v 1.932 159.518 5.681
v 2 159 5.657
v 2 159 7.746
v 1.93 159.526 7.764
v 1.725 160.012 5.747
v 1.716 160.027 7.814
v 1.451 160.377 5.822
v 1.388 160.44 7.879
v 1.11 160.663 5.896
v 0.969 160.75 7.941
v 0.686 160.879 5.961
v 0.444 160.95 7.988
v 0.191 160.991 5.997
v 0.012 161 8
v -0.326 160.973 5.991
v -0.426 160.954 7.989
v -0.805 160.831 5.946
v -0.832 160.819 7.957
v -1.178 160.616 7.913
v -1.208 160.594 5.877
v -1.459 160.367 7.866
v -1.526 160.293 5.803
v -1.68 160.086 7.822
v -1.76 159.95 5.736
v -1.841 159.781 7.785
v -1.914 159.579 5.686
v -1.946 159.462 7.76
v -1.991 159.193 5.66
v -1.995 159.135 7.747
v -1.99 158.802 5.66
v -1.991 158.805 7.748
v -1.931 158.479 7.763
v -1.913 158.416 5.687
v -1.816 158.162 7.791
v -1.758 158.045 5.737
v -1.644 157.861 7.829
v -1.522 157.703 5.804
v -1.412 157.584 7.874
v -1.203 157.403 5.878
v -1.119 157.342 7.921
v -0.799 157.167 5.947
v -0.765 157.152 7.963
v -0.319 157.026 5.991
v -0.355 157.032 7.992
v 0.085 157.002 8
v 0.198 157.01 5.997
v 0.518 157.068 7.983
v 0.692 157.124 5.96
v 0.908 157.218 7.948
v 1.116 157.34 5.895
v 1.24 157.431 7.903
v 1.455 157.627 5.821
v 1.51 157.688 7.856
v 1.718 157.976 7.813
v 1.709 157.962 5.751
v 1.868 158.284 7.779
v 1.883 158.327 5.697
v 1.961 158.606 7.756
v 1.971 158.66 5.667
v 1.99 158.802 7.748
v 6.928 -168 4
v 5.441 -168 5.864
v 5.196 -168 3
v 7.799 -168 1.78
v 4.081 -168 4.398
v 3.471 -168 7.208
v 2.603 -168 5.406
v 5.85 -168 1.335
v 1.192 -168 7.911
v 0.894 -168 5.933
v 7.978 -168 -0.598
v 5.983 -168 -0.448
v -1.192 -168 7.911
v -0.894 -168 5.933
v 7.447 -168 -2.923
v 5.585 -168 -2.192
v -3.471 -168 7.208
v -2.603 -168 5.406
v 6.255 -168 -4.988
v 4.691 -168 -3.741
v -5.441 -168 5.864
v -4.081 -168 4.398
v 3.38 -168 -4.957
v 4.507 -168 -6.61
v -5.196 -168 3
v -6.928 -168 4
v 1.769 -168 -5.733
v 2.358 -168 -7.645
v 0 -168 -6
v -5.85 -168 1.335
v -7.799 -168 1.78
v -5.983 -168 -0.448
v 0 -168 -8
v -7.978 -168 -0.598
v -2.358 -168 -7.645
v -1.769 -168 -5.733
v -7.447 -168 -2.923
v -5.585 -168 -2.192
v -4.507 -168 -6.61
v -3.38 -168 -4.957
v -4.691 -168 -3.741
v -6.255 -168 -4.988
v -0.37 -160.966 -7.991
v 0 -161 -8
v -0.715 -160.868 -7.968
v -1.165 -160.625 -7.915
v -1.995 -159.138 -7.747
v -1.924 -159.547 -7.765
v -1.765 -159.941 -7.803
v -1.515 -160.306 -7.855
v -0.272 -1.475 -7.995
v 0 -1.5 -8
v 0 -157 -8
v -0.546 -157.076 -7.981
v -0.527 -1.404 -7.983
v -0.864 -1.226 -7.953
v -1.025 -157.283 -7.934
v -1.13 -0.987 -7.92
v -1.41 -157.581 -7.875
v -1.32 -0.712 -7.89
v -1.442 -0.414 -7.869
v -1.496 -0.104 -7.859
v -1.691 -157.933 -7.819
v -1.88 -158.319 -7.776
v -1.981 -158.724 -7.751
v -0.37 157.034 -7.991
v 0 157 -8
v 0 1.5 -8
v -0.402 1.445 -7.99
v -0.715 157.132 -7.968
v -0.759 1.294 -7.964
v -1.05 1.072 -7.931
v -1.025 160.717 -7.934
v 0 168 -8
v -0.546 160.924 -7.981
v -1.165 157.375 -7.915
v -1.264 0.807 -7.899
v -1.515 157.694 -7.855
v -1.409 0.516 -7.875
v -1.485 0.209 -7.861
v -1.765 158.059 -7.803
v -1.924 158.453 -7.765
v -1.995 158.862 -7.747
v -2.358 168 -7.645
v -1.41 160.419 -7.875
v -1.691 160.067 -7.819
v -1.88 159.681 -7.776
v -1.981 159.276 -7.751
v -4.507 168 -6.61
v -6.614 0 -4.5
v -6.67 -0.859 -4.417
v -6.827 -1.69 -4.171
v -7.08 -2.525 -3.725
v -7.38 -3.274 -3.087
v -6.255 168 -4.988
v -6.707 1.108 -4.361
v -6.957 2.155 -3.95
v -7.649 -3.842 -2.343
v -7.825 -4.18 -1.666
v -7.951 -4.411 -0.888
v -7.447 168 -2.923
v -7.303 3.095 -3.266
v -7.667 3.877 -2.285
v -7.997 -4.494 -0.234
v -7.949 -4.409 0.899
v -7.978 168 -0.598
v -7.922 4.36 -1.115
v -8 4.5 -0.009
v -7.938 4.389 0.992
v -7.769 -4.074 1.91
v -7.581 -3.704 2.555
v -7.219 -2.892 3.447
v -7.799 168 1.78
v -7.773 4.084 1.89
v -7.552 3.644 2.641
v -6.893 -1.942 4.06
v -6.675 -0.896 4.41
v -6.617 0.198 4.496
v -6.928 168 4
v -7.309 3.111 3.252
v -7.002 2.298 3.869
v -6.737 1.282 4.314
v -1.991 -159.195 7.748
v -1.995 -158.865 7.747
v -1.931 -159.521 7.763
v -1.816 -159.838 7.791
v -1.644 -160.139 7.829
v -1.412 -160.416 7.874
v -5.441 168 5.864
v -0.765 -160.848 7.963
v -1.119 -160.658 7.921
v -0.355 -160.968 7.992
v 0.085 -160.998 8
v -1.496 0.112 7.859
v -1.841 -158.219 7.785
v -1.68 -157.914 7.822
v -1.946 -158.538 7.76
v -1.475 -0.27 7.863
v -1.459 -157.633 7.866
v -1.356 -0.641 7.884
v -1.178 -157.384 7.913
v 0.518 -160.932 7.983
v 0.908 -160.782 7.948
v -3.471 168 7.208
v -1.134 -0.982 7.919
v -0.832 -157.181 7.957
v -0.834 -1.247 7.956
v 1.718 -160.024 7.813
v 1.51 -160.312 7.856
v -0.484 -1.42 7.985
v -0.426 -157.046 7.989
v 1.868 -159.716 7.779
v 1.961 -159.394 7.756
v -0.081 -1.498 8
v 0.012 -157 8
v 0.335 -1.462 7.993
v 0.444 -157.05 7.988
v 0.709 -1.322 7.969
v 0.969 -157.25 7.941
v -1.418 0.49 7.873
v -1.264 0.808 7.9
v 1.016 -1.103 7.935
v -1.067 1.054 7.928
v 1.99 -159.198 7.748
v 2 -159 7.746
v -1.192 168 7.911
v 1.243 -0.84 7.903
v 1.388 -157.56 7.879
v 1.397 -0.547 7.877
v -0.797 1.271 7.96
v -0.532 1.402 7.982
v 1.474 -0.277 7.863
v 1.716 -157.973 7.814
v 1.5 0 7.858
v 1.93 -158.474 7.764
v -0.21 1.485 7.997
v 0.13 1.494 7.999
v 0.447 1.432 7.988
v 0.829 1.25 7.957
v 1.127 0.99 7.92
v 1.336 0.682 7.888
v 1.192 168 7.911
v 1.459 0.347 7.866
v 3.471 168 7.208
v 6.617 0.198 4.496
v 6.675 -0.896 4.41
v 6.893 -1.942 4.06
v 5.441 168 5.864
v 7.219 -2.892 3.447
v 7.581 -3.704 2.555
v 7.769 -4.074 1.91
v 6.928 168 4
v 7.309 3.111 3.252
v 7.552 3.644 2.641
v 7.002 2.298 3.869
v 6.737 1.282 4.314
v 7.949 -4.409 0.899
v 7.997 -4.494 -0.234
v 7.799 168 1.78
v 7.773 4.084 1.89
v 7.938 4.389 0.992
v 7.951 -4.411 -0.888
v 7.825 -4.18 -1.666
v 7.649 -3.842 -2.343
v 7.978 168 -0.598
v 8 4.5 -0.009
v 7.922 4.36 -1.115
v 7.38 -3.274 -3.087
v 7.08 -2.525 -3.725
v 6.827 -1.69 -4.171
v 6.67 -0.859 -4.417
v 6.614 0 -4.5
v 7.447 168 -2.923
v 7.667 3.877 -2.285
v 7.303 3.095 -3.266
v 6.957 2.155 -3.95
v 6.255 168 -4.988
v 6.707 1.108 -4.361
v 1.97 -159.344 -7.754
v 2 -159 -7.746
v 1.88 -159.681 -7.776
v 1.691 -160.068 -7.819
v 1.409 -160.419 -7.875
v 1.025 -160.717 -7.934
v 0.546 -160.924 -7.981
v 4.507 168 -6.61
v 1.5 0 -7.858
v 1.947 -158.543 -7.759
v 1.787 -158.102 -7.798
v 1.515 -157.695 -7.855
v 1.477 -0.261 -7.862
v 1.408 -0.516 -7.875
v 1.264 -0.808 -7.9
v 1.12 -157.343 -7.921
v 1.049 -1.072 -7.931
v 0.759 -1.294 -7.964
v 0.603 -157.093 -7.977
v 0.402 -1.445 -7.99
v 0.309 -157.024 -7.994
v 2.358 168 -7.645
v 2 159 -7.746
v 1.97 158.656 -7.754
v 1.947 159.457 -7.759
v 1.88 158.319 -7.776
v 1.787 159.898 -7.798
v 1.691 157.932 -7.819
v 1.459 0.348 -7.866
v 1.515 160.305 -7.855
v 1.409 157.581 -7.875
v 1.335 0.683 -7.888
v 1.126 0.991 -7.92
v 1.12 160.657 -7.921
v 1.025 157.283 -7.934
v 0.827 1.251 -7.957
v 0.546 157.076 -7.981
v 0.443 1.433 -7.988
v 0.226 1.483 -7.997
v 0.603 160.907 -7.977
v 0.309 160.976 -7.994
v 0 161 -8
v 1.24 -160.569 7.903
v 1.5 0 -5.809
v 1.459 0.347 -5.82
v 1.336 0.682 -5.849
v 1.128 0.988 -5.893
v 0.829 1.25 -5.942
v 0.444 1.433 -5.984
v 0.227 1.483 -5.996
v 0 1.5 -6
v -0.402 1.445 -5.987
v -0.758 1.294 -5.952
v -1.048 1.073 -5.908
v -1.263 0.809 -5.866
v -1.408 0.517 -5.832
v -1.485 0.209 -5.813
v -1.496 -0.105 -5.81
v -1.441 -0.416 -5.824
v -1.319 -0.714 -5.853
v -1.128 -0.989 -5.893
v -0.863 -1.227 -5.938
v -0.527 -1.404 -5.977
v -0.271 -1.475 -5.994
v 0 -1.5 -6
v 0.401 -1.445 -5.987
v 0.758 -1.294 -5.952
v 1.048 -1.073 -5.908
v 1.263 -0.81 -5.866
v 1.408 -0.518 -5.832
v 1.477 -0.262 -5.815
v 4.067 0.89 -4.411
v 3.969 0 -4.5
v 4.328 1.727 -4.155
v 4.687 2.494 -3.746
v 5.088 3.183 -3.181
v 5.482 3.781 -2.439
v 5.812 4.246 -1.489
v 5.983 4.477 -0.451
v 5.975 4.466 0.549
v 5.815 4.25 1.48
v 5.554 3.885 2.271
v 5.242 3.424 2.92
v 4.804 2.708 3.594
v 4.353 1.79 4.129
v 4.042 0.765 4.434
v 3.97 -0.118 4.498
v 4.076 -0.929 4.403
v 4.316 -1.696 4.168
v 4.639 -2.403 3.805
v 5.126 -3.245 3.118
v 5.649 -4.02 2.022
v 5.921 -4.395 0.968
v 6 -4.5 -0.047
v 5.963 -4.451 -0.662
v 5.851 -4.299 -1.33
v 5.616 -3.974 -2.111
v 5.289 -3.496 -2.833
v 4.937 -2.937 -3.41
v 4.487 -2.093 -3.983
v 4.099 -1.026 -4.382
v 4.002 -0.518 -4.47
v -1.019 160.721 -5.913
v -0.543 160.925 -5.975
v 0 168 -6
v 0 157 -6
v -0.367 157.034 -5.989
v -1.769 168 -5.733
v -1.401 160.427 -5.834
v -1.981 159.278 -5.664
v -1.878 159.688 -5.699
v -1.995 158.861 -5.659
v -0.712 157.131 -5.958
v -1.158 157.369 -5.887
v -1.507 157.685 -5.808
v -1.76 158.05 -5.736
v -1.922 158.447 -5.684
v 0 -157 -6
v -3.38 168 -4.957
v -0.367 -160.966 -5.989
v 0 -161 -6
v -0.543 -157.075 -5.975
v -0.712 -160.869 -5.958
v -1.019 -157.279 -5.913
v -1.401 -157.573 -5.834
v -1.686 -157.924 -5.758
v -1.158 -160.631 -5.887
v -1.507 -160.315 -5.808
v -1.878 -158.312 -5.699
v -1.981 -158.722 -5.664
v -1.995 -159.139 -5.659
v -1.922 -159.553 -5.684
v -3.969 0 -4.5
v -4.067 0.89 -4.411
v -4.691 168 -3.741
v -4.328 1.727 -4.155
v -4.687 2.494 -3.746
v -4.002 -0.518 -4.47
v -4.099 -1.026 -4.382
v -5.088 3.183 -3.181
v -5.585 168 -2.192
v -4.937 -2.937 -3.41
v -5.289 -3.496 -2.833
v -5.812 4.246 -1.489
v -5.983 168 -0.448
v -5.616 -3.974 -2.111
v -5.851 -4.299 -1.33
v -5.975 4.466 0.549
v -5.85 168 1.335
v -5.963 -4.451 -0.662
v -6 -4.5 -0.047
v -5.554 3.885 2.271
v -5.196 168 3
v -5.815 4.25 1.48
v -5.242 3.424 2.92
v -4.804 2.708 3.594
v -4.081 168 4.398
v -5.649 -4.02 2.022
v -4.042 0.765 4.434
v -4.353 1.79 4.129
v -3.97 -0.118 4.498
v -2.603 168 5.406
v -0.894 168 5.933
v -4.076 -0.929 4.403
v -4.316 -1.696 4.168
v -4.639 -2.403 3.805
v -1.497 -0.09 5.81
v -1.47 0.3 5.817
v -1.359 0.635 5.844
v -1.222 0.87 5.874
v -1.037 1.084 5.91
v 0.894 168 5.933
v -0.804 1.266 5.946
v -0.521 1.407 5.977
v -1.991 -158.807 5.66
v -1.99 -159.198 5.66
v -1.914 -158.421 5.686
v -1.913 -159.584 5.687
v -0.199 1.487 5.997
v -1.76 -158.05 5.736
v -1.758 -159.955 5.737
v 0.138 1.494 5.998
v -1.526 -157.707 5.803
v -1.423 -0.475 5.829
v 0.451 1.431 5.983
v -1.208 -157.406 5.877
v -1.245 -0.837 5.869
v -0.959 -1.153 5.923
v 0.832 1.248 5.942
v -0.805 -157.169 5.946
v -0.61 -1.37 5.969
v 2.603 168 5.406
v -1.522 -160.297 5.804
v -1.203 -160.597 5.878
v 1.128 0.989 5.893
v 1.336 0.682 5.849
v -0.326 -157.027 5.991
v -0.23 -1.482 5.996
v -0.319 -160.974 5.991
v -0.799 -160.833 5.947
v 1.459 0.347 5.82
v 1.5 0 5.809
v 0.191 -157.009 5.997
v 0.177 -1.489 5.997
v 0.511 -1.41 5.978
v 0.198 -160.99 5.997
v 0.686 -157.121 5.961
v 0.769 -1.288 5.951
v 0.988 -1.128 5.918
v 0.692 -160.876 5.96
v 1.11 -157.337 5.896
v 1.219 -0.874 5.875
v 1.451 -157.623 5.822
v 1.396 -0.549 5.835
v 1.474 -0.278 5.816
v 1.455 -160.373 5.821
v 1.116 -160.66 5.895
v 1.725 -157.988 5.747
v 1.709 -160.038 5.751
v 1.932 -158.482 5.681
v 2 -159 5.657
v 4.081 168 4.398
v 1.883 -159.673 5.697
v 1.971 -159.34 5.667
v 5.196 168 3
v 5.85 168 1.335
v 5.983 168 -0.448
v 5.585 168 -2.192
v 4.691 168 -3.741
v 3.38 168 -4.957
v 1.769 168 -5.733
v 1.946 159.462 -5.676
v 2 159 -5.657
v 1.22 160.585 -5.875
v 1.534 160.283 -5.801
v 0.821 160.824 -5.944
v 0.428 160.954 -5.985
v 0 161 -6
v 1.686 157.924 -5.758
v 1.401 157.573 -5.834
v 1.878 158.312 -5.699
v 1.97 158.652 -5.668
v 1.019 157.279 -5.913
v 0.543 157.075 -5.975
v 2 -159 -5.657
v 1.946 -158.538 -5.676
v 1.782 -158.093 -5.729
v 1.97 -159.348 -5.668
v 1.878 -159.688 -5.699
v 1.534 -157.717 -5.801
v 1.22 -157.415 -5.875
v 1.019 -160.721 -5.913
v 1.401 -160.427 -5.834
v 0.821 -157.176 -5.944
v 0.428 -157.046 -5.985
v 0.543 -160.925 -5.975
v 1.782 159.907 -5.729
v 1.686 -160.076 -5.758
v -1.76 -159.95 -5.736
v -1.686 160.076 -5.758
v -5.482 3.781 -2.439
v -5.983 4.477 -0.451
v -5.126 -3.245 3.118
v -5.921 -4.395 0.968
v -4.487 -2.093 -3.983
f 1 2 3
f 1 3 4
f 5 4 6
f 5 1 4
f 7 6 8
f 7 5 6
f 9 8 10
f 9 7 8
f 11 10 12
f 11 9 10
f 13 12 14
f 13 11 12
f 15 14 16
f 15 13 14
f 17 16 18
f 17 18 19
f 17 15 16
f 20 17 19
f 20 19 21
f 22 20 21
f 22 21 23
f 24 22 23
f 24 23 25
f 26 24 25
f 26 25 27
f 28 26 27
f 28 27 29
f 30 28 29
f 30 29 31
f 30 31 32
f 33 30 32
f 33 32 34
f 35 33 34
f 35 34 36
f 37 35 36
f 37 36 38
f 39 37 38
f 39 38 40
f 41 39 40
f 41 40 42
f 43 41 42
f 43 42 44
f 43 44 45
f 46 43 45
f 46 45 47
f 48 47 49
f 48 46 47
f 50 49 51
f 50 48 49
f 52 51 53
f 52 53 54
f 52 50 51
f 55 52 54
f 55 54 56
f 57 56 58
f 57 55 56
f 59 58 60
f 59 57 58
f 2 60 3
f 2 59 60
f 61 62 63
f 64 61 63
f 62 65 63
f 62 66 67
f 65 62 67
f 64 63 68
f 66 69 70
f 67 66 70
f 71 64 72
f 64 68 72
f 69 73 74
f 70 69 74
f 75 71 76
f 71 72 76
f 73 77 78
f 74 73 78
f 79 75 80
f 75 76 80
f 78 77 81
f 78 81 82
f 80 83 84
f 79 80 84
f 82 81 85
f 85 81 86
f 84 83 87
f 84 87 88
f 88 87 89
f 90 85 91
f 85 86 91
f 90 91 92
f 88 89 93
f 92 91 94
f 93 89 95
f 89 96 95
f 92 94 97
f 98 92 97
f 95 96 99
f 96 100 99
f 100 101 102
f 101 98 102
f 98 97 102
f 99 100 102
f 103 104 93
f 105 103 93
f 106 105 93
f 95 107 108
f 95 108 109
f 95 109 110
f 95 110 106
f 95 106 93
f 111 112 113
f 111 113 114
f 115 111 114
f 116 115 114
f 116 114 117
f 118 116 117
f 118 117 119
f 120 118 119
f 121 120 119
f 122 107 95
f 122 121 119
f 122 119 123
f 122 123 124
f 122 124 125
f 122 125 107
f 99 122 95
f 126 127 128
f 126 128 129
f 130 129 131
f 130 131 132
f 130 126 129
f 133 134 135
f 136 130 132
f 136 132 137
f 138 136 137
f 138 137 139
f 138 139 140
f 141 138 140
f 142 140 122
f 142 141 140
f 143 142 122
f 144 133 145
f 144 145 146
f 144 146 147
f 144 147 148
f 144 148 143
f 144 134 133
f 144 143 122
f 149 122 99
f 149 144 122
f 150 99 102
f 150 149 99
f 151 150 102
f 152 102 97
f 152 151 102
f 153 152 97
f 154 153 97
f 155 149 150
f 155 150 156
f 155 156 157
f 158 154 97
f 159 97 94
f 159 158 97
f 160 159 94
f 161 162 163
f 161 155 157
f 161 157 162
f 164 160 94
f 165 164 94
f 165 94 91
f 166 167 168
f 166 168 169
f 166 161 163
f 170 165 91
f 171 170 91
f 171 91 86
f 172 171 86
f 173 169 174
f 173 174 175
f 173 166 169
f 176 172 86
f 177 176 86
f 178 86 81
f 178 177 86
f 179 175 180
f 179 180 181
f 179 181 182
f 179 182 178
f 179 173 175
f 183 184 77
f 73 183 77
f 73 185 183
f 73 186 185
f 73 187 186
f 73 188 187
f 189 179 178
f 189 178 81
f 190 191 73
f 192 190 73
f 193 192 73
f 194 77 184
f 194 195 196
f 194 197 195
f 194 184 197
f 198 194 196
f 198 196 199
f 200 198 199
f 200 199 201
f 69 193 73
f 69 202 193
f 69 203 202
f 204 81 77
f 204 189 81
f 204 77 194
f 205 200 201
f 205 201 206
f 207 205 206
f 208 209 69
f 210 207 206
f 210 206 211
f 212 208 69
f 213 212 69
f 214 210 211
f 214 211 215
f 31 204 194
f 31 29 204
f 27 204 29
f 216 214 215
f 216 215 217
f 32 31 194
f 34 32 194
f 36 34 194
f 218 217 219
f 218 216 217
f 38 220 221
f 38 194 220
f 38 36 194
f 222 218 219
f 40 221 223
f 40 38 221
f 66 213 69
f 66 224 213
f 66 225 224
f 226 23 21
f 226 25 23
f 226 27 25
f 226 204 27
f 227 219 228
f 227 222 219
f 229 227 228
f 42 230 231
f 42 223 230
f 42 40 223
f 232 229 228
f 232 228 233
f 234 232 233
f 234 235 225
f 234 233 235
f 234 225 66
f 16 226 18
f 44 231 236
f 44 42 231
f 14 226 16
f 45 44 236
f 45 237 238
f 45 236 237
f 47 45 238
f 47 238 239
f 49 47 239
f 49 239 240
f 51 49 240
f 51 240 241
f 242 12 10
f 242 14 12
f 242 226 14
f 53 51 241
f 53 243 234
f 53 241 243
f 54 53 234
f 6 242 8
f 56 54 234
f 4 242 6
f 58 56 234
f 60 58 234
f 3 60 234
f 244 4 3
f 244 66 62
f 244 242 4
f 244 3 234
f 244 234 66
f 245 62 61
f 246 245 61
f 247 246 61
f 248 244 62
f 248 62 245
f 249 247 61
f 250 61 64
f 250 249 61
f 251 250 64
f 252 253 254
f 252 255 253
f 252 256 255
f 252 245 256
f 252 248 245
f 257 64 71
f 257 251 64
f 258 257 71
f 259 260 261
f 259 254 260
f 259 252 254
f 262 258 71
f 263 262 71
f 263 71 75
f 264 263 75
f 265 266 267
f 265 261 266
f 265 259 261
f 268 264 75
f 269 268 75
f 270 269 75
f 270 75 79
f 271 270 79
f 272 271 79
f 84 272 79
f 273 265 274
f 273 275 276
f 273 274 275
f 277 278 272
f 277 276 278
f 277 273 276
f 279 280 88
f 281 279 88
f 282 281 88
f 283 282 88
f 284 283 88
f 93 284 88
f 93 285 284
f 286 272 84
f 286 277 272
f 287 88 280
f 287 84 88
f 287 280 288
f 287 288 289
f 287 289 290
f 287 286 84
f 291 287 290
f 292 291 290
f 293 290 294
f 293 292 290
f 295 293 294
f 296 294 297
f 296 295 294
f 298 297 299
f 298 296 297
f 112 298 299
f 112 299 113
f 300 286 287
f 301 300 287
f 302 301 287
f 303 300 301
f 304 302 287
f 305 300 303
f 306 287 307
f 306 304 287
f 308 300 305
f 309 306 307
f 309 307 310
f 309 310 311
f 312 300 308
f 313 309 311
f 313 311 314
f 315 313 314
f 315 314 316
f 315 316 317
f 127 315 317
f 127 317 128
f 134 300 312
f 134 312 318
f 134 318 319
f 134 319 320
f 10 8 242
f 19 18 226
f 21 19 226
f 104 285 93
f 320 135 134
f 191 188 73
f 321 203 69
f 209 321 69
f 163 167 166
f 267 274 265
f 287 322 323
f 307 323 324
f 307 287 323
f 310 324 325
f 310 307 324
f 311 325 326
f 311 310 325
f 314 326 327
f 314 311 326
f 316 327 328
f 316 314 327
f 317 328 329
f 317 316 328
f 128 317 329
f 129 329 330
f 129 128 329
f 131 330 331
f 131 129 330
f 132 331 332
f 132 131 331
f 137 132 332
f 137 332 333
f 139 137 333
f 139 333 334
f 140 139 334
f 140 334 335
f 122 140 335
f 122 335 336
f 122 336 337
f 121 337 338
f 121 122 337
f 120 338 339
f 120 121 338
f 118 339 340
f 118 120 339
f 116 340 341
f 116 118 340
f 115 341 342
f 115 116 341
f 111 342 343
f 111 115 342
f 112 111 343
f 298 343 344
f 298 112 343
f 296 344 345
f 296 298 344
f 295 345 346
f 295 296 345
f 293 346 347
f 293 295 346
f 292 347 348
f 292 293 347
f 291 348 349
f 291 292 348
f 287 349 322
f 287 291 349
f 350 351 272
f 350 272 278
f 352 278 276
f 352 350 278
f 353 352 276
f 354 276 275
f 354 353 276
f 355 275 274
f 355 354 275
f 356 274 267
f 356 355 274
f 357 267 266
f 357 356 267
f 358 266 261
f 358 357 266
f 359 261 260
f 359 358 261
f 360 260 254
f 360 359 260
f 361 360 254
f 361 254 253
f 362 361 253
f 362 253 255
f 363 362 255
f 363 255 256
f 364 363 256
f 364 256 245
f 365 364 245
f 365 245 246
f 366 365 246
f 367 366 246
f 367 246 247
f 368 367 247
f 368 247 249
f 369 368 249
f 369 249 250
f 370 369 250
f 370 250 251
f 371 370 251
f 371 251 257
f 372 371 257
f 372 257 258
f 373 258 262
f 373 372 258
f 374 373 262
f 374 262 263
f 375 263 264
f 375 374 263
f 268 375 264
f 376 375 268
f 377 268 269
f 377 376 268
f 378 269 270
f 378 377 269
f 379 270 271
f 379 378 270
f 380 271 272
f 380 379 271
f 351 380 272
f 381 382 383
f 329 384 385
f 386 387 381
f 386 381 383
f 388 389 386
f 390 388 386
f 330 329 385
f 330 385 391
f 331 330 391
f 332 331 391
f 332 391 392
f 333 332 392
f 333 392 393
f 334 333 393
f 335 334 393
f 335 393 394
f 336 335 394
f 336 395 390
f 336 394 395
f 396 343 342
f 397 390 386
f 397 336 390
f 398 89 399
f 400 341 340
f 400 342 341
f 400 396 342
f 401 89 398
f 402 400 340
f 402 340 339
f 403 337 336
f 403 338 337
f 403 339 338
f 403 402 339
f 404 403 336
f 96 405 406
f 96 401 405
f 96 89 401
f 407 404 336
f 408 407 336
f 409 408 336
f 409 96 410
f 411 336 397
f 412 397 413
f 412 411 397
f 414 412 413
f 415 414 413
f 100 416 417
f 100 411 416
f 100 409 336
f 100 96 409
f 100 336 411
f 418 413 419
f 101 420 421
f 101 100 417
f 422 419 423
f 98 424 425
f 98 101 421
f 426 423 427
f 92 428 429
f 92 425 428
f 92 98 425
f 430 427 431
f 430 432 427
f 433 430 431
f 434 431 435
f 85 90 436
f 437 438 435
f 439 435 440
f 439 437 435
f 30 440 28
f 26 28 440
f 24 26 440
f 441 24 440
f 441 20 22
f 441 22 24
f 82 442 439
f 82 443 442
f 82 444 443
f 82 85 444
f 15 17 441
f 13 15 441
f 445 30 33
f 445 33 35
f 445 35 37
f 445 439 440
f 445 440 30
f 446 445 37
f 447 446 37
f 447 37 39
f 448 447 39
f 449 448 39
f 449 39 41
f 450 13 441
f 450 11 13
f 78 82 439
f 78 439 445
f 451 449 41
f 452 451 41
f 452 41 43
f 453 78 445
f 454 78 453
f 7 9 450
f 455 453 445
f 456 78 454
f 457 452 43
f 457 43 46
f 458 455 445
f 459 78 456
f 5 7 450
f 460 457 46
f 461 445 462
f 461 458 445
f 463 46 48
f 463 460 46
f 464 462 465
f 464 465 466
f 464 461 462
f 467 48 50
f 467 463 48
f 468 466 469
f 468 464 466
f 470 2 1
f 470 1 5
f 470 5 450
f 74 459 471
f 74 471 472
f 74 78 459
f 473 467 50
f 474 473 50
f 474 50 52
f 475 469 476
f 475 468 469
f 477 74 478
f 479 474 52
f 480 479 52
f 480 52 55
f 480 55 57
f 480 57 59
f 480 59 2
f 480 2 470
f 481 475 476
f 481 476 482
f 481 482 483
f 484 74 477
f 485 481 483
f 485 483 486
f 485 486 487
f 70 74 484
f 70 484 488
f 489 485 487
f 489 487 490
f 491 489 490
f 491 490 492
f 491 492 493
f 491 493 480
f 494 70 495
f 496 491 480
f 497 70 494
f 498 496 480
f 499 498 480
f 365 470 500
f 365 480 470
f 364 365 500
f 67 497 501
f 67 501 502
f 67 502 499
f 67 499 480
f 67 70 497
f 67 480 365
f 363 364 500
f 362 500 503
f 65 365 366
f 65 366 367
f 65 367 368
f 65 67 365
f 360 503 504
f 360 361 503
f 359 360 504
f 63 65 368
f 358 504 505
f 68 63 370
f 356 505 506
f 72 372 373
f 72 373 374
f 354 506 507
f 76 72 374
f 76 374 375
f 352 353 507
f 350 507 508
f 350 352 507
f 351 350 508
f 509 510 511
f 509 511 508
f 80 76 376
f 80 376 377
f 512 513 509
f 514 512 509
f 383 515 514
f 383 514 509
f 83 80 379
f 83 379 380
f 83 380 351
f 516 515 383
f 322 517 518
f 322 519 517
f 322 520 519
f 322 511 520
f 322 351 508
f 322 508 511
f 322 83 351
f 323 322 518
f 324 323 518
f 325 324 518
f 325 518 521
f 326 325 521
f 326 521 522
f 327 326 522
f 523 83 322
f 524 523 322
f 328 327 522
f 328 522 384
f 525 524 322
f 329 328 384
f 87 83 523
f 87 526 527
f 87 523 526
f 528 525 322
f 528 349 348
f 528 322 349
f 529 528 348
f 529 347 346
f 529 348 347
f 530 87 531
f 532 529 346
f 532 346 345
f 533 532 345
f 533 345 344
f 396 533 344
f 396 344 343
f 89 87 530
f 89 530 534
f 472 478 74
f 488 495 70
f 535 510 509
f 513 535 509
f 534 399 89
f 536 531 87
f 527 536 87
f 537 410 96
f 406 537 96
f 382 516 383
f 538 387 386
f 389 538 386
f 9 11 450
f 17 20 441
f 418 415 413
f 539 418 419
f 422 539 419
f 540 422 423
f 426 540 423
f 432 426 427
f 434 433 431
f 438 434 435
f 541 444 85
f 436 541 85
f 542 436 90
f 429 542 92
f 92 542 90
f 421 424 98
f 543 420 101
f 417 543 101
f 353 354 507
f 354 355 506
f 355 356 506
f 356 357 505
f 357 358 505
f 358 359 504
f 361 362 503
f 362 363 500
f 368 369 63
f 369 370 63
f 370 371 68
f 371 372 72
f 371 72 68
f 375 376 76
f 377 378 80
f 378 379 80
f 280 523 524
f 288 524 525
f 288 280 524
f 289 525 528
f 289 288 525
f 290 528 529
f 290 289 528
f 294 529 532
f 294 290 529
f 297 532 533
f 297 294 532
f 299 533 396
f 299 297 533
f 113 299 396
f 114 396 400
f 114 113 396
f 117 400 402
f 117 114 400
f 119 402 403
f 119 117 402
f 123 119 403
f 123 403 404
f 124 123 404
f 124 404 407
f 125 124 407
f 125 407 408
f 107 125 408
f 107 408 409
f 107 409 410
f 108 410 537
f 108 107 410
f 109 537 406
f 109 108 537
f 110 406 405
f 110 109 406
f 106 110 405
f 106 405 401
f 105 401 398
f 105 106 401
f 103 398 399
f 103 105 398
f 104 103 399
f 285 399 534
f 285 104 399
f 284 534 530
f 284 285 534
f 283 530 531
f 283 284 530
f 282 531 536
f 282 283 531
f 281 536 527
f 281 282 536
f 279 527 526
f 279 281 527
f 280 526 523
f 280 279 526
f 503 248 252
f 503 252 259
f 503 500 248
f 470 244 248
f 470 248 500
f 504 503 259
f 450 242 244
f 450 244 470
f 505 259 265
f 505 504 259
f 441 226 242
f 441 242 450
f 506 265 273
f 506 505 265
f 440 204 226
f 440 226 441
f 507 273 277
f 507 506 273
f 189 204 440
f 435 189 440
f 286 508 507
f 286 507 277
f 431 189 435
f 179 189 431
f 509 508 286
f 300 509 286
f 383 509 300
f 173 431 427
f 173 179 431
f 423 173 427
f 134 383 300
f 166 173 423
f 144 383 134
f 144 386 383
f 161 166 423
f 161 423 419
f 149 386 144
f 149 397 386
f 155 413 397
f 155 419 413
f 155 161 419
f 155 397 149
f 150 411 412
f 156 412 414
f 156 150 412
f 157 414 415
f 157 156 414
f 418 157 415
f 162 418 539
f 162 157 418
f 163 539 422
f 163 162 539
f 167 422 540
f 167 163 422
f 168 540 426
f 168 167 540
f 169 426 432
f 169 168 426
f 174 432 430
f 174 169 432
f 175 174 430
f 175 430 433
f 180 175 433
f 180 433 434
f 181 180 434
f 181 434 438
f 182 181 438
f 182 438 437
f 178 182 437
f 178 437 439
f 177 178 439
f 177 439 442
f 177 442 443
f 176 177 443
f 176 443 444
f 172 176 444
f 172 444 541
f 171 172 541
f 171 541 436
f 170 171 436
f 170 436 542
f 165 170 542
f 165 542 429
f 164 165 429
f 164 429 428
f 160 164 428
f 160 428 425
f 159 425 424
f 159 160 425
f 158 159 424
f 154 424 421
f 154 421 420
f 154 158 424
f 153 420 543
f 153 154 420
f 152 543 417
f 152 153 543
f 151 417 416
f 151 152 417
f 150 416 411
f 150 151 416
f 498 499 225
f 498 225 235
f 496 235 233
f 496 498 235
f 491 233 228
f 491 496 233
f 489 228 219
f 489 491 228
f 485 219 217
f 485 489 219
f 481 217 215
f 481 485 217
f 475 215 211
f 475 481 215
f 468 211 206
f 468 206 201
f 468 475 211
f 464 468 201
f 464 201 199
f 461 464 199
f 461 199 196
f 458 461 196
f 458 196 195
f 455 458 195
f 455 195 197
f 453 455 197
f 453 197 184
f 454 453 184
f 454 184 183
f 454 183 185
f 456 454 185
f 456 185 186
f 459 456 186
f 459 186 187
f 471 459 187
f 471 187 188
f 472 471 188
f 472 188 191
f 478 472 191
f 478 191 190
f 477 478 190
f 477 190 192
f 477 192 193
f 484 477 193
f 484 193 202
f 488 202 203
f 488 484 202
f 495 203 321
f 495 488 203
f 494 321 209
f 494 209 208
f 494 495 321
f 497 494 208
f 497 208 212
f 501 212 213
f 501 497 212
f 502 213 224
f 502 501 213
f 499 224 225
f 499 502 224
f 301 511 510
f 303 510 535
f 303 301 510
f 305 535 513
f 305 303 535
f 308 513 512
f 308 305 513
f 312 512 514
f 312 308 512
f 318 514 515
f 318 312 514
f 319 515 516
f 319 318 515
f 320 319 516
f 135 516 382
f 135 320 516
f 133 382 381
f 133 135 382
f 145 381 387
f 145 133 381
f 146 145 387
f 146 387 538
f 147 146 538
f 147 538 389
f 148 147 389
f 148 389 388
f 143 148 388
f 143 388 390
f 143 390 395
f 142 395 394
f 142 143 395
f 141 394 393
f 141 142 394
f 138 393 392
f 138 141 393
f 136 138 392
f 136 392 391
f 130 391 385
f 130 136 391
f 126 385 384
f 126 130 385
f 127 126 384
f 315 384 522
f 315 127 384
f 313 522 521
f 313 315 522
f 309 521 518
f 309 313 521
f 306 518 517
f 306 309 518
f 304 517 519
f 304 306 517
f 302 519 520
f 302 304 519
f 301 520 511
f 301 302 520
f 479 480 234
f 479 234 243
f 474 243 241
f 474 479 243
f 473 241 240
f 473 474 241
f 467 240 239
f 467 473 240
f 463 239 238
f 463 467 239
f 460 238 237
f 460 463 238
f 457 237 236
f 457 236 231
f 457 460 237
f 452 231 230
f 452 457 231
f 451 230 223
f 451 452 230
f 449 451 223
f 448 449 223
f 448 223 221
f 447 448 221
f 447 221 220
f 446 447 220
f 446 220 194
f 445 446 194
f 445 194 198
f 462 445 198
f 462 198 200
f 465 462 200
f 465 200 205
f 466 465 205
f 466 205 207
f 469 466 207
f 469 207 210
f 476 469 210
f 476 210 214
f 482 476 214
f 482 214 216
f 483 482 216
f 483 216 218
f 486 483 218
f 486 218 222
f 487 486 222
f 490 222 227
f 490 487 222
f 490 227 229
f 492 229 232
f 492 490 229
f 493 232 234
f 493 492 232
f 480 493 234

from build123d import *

# Parameters (mm, degrees)
SKETCH1_R               = 8
SKETCH1_R_2             = 6
BOSS_EXTRUDE1_DEPTH     = 168
CUT_EXTRUDE1_DEPTH      = 169.380521439
CUT_EXTRUDE1_DEPTH_BACK = 169.380521439
SKETCH2_R               = 4.5
CUT_EXTRUDE2_DEPTH      = 169.380521548
CUT_EXTRUDE2_DEPTH_BACK = 169.380521548
SKETCH3_R               = 1.5
CUT_EXTRUDE3_DEPTH      = 169.38052155
CUT_EXTRUDE3_DEPTH_BACK = 169.38052155
SKETCH4_R               = 2


with BuildPart() as part:
    # Sketch1 → Boss-Extrude1 (new, symmetric)
    with BuildSketch(Plane(origin=(0, 0, 0), x_dir=(1, 0, 0), z_dir=(0, 1, 0))):
        with Locations(Location((0, 0, 0), (0, 0, 90))):
            Circle(SKETCH1_R)
        with Locations(Location((0, 0, 0), (0, 0, 90))):
            Circle(SKETCH1_R_2, mode=Mode.SUBTRACT)
    extrude(amount=BOSS_EXTRUDE1_DEPTH, both=True)

    # Sketch2 → Cut-Extrude1 (cut, two sides: drawn at the far end of the back side and taken through both)
    with BuildSketch(Plane(origin=(0, 0, 0), x_dir=(0, 0, -1), z_dir=(1, 0, 0)).offset(-CUT_EXTRUDE1_DEPTH_BACK)):
        Circle(SKETCH2_R)
    extrude(amount=CUT_EXTRUDE1_DEPTH + CUT_EXTRUDE1_DEPTH_BACK, mode=Mode.SUBTRACT)

    # Sketch3 → Cut-Extrude2 (cut, two sides: drawn at the far end of the back side and taken through both)
    with BuildSketch(Plane.XY.offset(-CUT_EXTRUDE2_DEPTH_BACK)):
        Circle(SKETCH3_R)
    extrude(amount=CUT_EXTRUDE2_DEPTH + CUT_EXTRUDE2_DEPTH_BACK, mode=Mode.SUBTRACT)

    # Sketch4 → Cut-Extrude3 (cut, two sides: drawn at the far end of the back side and taken through both)
    with BuildSketch(Plane.XY.offset(-CUT_EXTRUDE3_DEPTH_BACK)):
        with Locations((0, 159)):
            Circle(SKETCH4_R)
        with Locations((0, -159)):
            Circle(SKETCH4_R)
    extrude(amount=CUT_EXTRUDE3_DEPTH + CUT_EXTRUDE3_DEPTH_BACK, mode=Mode.SUBTRACT)


solid = part.part
